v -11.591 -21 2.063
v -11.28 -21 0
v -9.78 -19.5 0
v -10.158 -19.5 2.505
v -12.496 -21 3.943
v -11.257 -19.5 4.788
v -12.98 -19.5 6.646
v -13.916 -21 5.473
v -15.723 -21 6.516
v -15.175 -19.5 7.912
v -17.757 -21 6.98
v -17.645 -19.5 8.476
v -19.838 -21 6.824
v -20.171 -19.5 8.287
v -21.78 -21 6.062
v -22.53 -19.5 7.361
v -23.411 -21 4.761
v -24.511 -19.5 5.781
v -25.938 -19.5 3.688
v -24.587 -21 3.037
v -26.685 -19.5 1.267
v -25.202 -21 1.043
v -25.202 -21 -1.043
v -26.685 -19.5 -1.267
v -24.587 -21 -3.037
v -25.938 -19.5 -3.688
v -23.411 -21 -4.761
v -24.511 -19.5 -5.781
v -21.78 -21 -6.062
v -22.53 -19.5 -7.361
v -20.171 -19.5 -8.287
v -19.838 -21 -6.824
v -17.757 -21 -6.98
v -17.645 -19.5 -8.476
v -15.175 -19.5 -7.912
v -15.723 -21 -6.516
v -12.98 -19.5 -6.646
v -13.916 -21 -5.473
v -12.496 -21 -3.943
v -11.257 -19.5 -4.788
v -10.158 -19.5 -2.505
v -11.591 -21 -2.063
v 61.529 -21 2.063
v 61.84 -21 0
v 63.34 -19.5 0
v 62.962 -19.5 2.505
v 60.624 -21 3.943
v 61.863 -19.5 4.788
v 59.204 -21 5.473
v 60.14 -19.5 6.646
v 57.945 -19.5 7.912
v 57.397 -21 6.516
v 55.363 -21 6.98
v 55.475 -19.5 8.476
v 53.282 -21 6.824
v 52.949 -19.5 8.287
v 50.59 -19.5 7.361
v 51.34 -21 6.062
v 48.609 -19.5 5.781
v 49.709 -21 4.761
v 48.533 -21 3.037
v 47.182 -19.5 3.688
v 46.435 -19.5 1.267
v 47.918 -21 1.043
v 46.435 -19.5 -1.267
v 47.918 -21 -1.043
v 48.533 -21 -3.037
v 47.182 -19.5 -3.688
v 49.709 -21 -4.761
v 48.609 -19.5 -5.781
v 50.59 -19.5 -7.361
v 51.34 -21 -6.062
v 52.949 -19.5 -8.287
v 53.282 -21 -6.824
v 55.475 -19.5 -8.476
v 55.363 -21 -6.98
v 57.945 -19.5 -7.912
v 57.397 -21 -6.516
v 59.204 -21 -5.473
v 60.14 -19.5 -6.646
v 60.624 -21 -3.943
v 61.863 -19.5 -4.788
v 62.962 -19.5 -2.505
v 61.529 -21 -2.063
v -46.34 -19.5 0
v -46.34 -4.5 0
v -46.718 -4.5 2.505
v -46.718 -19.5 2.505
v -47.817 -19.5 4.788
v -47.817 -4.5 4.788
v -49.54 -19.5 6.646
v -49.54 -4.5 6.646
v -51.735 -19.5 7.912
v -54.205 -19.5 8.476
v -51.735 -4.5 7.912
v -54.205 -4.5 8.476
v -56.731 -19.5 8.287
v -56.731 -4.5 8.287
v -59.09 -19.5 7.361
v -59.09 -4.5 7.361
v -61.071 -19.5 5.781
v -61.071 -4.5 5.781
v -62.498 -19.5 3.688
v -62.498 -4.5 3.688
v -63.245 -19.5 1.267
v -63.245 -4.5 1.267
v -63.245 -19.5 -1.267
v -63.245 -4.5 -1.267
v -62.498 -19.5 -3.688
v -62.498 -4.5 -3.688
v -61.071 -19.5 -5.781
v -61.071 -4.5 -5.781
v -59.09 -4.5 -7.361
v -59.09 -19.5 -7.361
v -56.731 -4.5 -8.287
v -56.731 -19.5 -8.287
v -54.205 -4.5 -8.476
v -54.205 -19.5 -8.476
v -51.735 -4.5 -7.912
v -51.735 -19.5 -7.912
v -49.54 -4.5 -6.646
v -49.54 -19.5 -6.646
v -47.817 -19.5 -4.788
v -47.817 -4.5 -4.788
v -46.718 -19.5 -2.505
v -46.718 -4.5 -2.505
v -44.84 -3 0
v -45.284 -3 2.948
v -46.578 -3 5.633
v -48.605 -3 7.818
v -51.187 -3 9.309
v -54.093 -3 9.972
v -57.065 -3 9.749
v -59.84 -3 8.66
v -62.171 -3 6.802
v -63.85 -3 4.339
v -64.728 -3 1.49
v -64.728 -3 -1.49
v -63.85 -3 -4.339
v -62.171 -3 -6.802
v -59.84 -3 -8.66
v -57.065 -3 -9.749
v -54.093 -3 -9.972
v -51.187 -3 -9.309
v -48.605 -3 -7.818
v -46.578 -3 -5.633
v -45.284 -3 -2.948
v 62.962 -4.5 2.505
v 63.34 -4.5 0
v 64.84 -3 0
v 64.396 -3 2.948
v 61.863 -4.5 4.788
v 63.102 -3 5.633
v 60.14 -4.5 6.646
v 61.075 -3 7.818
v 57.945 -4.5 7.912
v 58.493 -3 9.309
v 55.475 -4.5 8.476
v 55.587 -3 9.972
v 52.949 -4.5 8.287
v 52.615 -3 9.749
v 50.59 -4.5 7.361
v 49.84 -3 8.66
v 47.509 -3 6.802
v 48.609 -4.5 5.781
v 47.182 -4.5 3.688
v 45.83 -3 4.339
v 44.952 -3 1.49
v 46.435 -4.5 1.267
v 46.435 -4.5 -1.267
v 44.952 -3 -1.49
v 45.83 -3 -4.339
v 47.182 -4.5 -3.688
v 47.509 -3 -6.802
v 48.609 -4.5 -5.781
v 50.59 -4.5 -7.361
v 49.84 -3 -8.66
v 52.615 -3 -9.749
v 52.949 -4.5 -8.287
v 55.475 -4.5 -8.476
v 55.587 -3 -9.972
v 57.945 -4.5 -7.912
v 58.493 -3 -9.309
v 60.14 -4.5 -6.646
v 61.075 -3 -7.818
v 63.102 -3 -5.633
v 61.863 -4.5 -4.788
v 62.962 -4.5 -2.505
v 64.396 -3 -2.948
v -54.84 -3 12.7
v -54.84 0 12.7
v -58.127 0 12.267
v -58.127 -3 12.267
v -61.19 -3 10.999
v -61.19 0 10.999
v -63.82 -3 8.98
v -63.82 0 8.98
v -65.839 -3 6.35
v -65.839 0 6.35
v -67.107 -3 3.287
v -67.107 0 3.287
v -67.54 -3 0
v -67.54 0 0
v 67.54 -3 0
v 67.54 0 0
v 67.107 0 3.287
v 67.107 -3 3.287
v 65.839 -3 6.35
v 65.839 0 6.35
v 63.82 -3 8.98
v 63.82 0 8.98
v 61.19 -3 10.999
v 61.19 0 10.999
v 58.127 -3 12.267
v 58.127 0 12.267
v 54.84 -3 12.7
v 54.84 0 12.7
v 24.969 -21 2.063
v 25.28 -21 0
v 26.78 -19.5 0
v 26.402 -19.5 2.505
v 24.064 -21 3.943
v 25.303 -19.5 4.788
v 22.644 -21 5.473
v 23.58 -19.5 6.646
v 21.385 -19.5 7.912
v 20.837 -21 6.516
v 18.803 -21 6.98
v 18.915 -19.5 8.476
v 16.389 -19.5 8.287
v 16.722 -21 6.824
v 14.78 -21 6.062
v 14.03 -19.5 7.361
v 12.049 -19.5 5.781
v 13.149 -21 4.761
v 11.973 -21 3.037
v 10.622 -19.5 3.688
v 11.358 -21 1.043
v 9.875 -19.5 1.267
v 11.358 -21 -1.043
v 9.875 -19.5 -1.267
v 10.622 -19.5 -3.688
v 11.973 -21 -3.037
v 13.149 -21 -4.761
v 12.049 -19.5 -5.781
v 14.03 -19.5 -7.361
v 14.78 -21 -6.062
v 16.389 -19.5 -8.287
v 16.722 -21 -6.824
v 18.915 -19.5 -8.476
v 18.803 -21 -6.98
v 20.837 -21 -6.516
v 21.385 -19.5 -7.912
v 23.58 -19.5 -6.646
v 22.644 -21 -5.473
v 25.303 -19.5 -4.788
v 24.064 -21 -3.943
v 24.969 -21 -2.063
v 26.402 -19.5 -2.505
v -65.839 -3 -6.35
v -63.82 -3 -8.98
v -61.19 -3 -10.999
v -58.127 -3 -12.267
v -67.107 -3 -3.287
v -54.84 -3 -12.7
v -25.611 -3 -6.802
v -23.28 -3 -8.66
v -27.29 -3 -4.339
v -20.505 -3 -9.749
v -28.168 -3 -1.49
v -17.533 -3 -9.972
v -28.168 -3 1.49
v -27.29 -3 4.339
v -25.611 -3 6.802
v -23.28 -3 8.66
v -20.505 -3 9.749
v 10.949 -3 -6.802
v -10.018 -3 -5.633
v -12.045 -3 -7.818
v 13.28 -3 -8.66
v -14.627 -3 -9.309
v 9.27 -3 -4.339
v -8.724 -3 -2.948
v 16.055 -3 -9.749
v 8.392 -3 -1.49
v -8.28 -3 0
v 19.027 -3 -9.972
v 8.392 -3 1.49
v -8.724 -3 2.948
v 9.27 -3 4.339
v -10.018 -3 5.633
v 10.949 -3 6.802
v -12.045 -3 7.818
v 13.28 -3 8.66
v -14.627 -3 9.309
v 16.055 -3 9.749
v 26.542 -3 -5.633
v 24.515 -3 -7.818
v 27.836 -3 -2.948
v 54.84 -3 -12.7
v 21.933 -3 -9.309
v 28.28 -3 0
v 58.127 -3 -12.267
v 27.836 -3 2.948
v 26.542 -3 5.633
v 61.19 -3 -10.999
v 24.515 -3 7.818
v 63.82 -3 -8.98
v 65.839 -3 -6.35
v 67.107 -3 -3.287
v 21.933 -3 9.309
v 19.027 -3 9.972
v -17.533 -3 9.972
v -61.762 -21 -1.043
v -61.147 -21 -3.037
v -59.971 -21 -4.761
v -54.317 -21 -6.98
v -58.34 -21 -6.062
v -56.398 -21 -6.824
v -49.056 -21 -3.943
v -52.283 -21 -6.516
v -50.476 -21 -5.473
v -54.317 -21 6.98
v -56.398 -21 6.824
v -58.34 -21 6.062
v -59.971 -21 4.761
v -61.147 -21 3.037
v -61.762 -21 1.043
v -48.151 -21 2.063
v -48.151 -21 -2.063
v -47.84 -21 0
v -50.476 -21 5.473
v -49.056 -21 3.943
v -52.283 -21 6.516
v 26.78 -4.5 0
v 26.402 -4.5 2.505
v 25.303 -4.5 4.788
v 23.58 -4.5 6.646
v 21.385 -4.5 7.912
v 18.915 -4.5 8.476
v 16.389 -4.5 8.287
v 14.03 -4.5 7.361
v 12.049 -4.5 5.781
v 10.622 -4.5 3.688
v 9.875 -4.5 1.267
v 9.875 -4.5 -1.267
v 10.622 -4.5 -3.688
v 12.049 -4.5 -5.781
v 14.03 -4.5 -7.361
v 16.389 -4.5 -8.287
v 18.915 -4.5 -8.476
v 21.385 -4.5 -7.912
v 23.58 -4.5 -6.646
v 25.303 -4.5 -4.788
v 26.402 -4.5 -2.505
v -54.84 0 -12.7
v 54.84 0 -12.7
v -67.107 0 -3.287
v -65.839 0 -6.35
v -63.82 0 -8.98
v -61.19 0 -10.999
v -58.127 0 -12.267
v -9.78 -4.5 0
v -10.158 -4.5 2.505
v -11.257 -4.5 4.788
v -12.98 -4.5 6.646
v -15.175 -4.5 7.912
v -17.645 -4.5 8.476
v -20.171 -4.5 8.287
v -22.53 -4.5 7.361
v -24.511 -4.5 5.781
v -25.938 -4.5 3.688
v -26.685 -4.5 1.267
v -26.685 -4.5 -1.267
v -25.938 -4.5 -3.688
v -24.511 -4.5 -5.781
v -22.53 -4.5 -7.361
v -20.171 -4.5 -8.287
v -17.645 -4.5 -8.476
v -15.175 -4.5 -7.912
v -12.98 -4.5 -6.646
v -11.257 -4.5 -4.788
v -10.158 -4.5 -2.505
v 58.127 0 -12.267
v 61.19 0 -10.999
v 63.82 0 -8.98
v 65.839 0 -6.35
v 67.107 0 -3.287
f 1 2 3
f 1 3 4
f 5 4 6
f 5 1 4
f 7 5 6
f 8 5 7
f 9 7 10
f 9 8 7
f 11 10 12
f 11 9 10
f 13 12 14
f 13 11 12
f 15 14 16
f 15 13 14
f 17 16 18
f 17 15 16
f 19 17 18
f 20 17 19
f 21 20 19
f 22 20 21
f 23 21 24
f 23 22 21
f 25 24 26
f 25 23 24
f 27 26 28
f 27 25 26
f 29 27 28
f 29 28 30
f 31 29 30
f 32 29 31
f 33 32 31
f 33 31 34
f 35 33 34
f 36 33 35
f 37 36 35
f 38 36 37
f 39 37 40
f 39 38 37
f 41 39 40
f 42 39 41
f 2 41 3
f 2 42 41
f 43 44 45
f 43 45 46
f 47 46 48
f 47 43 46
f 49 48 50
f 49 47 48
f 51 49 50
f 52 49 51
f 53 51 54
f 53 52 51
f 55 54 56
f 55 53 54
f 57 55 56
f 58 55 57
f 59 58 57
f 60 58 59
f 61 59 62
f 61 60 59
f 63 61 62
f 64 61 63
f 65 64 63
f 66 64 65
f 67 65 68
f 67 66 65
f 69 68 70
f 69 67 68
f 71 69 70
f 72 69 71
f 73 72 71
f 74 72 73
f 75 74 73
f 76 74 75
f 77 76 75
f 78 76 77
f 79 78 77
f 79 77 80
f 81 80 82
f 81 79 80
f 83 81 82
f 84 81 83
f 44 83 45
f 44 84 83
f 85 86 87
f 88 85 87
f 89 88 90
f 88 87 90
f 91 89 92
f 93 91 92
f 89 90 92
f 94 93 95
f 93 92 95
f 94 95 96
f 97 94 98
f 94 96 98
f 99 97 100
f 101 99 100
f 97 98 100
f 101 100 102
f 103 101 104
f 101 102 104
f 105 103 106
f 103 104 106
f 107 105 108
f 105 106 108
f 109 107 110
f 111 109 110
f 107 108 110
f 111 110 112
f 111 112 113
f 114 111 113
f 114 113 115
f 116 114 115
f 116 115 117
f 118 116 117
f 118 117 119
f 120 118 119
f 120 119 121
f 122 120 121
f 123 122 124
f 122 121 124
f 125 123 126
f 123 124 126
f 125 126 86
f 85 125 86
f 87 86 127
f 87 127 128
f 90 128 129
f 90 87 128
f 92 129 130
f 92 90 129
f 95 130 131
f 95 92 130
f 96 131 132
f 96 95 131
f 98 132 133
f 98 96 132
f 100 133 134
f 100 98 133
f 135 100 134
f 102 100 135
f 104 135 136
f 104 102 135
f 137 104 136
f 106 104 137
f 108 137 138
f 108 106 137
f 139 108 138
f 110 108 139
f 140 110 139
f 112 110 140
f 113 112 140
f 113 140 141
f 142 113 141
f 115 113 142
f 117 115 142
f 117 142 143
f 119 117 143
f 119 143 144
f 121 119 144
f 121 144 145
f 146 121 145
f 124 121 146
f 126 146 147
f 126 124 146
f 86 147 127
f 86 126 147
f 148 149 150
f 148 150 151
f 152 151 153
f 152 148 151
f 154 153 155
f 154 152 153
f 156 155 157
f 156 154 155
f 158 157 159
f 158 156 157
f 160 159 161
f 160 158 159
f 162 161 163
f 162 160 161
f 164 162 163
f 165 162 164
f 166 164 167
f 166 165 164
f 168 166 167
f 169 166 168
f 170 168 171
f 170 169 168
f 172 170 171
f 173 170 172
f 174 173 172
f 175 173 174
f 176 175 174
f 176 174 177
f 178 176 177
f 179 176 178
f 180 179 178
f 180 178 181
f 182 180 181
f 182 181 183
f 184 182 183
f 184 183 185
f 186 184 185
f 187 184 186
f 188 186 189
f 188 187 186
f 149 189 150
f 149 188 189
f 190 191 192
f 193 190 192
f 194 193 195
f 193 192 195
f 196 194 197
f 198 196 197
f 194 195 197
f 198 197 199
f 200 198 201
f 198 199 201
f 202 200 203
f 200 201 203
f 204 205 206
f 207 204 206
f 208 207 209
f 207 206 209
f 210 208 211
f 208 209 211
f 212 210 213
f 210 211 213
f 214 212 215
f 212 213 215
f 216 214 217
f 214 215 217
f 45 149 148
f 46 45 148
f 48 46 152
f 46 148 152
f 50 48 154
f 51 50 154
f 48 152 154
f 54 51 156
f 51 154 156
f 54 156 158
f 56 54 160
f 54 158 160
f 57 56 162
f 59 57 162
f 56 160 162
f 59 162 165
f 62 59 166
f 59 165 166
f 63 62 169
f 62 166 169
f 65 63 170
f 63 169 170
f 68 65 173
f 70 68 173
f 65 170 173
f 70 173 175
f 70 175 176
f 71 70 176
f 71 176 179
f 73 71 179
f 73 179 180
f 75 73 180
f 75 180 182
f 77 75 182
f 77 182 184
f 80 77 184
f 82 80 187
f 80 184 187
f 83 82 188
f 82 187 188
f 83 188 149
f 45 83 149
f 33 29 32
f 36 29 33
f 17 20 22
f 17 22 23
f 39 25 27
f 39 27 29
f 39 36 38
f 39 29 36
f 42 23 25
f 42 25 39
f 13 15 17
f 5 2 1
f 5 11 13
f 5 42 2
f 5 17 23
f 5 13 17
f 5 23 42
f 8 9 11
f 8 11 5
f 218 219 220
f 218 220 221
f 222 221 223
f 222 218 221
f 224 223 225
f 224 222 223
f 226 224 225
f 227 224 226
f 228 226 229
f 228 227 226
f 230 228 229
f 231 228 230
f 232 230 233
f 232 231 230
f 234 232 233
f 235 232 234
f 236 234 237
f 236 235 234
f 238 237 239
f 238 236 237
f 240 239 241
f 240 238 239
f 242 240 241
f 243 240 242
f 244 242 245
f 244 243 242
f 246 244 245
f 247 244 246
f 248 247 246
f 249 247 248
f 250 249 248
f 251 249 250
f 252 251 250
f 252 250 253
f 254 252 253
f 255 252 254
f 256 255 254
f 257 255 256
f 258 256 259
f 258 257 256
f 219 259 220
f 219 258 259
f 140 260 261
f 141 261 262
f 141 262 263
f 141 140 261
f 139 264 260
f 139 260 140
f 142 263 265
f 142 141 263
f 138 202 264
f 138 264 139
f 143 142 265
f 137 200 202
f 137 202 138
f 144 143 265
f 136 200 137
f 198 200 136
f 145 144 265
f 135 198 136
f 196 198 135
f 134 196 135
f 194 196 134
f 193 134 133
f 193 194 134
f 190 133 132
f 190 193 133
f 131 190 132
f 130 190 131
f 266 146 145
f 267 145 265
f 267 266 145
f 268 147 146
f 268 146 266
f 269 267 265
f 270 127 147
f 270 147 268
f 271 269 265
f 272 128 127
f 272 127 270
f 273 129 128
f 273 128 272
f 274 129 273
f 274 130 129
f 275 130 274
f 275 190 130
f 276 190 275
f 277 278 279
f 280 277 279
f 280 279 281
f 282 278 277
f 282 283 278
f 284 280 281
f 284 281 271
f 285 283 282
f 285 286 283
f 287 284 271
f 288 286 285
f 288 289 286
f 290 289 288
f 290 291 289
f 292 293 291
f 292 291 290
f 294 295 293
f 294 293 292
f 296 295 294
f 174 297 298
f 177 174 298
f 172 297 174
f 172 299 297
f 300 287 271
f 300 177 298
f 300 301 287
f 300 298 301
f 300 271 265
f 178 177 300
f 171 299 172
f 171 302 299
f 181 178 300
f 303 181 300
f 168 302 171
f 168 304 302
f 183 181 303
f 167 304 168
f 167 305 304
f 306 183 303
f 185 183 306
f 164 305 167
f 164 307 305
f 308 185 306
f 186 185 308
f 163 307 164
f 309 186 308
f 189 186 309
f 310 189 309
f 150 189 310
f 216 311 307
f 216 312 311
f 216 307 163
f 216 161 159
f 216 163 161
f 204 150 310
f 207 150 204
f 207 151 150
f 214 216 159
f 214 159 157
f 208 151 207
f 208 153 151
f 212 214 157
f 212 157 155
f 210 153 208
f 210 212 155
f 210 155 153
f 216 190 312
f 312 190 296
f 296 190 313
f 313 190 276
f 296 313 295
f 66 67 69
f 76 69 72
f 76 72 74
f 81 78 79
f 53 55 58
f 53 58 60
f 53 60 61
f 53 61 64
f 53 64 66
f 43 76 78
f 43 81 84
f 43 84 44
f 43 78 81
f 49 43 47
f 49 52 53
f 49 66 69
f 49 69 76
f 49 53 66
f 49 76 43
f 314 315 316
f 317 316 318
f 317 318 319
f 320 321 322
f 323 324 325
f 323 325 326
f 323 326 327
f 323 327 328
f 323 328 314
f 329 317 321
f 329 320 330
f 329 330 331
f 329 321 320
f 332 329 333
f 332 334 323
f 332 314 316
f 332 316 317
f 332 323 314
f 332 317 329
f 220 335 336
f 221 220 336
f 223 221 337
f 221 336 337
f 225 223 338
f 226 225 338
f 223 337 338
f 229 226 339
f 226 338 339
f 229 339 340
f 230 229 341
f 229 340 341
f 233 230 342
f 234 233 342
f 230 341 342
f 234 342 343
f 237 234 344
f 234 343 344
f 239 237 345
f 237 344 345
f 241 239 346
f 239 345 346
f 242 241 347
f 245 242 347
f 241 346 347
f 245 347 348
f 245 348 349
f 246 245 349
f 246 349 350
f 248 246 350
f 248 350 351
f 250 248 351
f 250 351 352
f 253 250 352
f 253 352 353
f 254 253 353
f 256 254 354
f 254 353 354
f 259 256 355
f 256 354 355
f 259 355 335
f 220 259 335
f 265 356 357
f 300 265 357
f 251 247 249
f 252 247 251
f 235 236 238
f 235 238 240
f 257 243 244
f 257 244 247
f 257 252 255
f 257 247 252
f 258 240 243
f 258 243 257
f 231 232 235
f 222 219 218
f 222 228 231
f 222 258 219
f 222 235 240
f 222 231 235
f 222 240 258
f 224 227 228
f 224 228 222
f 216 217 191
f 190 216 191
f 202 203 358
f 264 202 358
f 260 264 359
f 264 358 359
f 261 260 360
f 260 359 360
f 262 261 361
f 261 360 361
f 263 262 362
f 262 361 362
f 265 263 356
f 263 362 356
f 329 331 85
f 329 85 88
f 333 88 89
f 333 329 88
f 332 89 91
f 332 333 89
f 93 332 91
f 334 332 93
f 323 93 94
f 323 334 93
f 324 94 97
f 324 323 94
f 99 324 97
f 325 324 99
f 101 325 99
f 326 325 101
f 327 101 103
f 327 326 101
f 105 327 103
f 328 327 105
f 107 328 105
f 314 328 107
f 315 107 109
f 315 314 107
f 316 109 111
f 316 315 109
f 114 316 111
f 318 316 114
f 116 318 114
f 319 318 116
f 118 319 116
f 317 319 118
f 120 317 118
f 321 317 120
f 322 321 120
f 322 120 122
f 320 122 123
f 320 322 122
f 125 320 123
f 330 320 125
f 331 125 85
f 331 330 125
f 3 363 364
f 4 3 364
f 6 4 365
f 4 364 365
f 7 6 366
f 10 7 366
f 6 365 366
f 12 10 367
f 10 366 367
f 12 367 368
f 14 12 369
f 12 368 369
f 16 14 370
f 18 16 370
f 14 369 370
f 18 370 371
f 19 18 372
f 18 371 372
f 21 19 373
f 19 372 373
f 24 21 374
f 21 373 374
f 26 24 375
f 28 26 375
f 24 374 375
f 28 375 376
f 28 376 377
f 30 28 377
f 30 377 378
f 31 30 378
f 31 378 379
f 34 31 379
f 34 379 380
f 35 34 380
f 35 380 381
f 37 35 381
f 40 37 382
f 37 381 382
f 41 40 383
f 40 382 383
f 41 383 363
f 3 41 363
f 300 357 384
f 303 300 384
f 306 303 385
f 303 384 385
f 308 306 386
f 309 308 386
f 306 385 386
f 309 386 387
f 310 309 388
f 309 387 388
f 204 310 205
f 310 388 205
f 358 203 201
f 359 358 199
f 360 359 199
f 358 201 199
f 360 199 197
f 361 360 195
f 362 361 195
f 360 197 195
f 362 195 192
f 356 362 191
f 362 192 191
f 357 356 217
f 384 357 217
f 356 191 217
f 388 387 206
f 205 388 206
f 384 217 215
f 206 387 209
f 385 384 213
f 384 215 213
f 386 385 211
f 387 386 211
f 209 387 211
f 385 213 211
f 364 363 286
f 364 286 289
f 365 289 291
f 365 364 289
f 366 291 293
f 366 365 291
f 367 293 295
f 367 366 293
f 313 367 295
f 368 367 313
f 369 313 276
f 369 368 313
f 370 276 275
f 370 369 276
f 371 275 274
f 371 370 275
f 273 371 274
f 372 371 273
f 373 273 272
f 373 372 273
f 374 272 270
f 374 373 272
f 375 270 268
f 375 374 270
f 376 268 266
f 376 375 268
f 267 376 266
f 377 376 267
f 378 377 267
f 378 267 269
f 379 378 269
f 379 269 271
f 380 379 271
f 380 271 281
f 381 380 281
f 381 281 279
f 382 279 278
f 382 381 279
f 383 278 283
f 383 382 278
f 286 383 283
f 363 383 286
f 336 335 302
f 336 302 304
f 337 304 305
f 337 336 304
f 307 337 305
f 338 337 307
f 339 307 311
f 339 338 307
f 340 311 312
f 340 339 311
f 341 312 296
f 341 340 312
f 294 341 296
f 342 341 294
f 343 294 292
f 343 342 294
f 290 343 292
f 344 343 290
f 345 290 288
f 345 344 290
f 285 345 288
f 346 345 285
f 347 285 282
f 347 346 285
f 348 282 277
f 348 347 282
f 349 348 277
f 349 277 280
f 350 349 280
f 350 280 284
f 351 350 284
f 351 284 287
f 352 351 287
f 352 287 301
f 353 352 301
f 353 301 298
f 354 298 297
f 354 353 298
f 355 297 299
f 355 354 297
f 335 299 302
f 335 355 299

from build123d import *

# Parameters (mm, degrees)
F1_DEPTH = 3
F2_R     = 8.5
F3_DEPTH = 18
F4_SIZE  = 1.5


with BuildPart() as f1:
    # F0 (on Front) → F1 (new body)
    with BuildSketch(Plane.XZ):
        with BuildLine():
            Line((54.84, 12.7), (-54.84, 12.7))
            ThreePointArc((-54.84, 12.7), (-63.820256, 8.980256), (-67.54, 0))
            ThreePointArc((-67.54, 0), (-63.820256, -8.980256), (-54.84, -12.7))
            Line((-54.84, -12.7), (54.84, -12.7))
            ThreePointArc((54.84, -12.7), (63.820256, -8.980256), (67.54, 0))
            ThreePointArc((67.54, 0), (63.820256, 8.980256), (54.84, 12.7))
        make_face()
    extrude(amount=F1_DEPTH)

    # F2 (on face) → F3 (join)
    with BuildSketch(Plane.XZ.offset(3)):
        with Locations((-54.84, 0)):
            Circle(F2_R)
        with Locations((54.84, 0)):
            Circle(F2_R)
        with Locations((-18.28, 0)):
            Circle(F2_R)
        with Locations((18.28, 0)):
            Circle(F2_R)
    extrude(amount=F3_DEPTH)

    # F4
    f4_edges = [f1.edges().sort_by_distance(p)[0] for p in [
        (-63.34, -21, 0),
        (-26.78, -21, 0),
        (9.78, -21, 0),
        (46.34, -21, 0),
        (-26.78, -3, 0),
        (-63.34, -3, 0),
        (9.78, -3, 0),
        (46.34, -3, 0),
    ]]
    chamfer(f4_edges, length=F4_SIZE)


solid = f1.part
